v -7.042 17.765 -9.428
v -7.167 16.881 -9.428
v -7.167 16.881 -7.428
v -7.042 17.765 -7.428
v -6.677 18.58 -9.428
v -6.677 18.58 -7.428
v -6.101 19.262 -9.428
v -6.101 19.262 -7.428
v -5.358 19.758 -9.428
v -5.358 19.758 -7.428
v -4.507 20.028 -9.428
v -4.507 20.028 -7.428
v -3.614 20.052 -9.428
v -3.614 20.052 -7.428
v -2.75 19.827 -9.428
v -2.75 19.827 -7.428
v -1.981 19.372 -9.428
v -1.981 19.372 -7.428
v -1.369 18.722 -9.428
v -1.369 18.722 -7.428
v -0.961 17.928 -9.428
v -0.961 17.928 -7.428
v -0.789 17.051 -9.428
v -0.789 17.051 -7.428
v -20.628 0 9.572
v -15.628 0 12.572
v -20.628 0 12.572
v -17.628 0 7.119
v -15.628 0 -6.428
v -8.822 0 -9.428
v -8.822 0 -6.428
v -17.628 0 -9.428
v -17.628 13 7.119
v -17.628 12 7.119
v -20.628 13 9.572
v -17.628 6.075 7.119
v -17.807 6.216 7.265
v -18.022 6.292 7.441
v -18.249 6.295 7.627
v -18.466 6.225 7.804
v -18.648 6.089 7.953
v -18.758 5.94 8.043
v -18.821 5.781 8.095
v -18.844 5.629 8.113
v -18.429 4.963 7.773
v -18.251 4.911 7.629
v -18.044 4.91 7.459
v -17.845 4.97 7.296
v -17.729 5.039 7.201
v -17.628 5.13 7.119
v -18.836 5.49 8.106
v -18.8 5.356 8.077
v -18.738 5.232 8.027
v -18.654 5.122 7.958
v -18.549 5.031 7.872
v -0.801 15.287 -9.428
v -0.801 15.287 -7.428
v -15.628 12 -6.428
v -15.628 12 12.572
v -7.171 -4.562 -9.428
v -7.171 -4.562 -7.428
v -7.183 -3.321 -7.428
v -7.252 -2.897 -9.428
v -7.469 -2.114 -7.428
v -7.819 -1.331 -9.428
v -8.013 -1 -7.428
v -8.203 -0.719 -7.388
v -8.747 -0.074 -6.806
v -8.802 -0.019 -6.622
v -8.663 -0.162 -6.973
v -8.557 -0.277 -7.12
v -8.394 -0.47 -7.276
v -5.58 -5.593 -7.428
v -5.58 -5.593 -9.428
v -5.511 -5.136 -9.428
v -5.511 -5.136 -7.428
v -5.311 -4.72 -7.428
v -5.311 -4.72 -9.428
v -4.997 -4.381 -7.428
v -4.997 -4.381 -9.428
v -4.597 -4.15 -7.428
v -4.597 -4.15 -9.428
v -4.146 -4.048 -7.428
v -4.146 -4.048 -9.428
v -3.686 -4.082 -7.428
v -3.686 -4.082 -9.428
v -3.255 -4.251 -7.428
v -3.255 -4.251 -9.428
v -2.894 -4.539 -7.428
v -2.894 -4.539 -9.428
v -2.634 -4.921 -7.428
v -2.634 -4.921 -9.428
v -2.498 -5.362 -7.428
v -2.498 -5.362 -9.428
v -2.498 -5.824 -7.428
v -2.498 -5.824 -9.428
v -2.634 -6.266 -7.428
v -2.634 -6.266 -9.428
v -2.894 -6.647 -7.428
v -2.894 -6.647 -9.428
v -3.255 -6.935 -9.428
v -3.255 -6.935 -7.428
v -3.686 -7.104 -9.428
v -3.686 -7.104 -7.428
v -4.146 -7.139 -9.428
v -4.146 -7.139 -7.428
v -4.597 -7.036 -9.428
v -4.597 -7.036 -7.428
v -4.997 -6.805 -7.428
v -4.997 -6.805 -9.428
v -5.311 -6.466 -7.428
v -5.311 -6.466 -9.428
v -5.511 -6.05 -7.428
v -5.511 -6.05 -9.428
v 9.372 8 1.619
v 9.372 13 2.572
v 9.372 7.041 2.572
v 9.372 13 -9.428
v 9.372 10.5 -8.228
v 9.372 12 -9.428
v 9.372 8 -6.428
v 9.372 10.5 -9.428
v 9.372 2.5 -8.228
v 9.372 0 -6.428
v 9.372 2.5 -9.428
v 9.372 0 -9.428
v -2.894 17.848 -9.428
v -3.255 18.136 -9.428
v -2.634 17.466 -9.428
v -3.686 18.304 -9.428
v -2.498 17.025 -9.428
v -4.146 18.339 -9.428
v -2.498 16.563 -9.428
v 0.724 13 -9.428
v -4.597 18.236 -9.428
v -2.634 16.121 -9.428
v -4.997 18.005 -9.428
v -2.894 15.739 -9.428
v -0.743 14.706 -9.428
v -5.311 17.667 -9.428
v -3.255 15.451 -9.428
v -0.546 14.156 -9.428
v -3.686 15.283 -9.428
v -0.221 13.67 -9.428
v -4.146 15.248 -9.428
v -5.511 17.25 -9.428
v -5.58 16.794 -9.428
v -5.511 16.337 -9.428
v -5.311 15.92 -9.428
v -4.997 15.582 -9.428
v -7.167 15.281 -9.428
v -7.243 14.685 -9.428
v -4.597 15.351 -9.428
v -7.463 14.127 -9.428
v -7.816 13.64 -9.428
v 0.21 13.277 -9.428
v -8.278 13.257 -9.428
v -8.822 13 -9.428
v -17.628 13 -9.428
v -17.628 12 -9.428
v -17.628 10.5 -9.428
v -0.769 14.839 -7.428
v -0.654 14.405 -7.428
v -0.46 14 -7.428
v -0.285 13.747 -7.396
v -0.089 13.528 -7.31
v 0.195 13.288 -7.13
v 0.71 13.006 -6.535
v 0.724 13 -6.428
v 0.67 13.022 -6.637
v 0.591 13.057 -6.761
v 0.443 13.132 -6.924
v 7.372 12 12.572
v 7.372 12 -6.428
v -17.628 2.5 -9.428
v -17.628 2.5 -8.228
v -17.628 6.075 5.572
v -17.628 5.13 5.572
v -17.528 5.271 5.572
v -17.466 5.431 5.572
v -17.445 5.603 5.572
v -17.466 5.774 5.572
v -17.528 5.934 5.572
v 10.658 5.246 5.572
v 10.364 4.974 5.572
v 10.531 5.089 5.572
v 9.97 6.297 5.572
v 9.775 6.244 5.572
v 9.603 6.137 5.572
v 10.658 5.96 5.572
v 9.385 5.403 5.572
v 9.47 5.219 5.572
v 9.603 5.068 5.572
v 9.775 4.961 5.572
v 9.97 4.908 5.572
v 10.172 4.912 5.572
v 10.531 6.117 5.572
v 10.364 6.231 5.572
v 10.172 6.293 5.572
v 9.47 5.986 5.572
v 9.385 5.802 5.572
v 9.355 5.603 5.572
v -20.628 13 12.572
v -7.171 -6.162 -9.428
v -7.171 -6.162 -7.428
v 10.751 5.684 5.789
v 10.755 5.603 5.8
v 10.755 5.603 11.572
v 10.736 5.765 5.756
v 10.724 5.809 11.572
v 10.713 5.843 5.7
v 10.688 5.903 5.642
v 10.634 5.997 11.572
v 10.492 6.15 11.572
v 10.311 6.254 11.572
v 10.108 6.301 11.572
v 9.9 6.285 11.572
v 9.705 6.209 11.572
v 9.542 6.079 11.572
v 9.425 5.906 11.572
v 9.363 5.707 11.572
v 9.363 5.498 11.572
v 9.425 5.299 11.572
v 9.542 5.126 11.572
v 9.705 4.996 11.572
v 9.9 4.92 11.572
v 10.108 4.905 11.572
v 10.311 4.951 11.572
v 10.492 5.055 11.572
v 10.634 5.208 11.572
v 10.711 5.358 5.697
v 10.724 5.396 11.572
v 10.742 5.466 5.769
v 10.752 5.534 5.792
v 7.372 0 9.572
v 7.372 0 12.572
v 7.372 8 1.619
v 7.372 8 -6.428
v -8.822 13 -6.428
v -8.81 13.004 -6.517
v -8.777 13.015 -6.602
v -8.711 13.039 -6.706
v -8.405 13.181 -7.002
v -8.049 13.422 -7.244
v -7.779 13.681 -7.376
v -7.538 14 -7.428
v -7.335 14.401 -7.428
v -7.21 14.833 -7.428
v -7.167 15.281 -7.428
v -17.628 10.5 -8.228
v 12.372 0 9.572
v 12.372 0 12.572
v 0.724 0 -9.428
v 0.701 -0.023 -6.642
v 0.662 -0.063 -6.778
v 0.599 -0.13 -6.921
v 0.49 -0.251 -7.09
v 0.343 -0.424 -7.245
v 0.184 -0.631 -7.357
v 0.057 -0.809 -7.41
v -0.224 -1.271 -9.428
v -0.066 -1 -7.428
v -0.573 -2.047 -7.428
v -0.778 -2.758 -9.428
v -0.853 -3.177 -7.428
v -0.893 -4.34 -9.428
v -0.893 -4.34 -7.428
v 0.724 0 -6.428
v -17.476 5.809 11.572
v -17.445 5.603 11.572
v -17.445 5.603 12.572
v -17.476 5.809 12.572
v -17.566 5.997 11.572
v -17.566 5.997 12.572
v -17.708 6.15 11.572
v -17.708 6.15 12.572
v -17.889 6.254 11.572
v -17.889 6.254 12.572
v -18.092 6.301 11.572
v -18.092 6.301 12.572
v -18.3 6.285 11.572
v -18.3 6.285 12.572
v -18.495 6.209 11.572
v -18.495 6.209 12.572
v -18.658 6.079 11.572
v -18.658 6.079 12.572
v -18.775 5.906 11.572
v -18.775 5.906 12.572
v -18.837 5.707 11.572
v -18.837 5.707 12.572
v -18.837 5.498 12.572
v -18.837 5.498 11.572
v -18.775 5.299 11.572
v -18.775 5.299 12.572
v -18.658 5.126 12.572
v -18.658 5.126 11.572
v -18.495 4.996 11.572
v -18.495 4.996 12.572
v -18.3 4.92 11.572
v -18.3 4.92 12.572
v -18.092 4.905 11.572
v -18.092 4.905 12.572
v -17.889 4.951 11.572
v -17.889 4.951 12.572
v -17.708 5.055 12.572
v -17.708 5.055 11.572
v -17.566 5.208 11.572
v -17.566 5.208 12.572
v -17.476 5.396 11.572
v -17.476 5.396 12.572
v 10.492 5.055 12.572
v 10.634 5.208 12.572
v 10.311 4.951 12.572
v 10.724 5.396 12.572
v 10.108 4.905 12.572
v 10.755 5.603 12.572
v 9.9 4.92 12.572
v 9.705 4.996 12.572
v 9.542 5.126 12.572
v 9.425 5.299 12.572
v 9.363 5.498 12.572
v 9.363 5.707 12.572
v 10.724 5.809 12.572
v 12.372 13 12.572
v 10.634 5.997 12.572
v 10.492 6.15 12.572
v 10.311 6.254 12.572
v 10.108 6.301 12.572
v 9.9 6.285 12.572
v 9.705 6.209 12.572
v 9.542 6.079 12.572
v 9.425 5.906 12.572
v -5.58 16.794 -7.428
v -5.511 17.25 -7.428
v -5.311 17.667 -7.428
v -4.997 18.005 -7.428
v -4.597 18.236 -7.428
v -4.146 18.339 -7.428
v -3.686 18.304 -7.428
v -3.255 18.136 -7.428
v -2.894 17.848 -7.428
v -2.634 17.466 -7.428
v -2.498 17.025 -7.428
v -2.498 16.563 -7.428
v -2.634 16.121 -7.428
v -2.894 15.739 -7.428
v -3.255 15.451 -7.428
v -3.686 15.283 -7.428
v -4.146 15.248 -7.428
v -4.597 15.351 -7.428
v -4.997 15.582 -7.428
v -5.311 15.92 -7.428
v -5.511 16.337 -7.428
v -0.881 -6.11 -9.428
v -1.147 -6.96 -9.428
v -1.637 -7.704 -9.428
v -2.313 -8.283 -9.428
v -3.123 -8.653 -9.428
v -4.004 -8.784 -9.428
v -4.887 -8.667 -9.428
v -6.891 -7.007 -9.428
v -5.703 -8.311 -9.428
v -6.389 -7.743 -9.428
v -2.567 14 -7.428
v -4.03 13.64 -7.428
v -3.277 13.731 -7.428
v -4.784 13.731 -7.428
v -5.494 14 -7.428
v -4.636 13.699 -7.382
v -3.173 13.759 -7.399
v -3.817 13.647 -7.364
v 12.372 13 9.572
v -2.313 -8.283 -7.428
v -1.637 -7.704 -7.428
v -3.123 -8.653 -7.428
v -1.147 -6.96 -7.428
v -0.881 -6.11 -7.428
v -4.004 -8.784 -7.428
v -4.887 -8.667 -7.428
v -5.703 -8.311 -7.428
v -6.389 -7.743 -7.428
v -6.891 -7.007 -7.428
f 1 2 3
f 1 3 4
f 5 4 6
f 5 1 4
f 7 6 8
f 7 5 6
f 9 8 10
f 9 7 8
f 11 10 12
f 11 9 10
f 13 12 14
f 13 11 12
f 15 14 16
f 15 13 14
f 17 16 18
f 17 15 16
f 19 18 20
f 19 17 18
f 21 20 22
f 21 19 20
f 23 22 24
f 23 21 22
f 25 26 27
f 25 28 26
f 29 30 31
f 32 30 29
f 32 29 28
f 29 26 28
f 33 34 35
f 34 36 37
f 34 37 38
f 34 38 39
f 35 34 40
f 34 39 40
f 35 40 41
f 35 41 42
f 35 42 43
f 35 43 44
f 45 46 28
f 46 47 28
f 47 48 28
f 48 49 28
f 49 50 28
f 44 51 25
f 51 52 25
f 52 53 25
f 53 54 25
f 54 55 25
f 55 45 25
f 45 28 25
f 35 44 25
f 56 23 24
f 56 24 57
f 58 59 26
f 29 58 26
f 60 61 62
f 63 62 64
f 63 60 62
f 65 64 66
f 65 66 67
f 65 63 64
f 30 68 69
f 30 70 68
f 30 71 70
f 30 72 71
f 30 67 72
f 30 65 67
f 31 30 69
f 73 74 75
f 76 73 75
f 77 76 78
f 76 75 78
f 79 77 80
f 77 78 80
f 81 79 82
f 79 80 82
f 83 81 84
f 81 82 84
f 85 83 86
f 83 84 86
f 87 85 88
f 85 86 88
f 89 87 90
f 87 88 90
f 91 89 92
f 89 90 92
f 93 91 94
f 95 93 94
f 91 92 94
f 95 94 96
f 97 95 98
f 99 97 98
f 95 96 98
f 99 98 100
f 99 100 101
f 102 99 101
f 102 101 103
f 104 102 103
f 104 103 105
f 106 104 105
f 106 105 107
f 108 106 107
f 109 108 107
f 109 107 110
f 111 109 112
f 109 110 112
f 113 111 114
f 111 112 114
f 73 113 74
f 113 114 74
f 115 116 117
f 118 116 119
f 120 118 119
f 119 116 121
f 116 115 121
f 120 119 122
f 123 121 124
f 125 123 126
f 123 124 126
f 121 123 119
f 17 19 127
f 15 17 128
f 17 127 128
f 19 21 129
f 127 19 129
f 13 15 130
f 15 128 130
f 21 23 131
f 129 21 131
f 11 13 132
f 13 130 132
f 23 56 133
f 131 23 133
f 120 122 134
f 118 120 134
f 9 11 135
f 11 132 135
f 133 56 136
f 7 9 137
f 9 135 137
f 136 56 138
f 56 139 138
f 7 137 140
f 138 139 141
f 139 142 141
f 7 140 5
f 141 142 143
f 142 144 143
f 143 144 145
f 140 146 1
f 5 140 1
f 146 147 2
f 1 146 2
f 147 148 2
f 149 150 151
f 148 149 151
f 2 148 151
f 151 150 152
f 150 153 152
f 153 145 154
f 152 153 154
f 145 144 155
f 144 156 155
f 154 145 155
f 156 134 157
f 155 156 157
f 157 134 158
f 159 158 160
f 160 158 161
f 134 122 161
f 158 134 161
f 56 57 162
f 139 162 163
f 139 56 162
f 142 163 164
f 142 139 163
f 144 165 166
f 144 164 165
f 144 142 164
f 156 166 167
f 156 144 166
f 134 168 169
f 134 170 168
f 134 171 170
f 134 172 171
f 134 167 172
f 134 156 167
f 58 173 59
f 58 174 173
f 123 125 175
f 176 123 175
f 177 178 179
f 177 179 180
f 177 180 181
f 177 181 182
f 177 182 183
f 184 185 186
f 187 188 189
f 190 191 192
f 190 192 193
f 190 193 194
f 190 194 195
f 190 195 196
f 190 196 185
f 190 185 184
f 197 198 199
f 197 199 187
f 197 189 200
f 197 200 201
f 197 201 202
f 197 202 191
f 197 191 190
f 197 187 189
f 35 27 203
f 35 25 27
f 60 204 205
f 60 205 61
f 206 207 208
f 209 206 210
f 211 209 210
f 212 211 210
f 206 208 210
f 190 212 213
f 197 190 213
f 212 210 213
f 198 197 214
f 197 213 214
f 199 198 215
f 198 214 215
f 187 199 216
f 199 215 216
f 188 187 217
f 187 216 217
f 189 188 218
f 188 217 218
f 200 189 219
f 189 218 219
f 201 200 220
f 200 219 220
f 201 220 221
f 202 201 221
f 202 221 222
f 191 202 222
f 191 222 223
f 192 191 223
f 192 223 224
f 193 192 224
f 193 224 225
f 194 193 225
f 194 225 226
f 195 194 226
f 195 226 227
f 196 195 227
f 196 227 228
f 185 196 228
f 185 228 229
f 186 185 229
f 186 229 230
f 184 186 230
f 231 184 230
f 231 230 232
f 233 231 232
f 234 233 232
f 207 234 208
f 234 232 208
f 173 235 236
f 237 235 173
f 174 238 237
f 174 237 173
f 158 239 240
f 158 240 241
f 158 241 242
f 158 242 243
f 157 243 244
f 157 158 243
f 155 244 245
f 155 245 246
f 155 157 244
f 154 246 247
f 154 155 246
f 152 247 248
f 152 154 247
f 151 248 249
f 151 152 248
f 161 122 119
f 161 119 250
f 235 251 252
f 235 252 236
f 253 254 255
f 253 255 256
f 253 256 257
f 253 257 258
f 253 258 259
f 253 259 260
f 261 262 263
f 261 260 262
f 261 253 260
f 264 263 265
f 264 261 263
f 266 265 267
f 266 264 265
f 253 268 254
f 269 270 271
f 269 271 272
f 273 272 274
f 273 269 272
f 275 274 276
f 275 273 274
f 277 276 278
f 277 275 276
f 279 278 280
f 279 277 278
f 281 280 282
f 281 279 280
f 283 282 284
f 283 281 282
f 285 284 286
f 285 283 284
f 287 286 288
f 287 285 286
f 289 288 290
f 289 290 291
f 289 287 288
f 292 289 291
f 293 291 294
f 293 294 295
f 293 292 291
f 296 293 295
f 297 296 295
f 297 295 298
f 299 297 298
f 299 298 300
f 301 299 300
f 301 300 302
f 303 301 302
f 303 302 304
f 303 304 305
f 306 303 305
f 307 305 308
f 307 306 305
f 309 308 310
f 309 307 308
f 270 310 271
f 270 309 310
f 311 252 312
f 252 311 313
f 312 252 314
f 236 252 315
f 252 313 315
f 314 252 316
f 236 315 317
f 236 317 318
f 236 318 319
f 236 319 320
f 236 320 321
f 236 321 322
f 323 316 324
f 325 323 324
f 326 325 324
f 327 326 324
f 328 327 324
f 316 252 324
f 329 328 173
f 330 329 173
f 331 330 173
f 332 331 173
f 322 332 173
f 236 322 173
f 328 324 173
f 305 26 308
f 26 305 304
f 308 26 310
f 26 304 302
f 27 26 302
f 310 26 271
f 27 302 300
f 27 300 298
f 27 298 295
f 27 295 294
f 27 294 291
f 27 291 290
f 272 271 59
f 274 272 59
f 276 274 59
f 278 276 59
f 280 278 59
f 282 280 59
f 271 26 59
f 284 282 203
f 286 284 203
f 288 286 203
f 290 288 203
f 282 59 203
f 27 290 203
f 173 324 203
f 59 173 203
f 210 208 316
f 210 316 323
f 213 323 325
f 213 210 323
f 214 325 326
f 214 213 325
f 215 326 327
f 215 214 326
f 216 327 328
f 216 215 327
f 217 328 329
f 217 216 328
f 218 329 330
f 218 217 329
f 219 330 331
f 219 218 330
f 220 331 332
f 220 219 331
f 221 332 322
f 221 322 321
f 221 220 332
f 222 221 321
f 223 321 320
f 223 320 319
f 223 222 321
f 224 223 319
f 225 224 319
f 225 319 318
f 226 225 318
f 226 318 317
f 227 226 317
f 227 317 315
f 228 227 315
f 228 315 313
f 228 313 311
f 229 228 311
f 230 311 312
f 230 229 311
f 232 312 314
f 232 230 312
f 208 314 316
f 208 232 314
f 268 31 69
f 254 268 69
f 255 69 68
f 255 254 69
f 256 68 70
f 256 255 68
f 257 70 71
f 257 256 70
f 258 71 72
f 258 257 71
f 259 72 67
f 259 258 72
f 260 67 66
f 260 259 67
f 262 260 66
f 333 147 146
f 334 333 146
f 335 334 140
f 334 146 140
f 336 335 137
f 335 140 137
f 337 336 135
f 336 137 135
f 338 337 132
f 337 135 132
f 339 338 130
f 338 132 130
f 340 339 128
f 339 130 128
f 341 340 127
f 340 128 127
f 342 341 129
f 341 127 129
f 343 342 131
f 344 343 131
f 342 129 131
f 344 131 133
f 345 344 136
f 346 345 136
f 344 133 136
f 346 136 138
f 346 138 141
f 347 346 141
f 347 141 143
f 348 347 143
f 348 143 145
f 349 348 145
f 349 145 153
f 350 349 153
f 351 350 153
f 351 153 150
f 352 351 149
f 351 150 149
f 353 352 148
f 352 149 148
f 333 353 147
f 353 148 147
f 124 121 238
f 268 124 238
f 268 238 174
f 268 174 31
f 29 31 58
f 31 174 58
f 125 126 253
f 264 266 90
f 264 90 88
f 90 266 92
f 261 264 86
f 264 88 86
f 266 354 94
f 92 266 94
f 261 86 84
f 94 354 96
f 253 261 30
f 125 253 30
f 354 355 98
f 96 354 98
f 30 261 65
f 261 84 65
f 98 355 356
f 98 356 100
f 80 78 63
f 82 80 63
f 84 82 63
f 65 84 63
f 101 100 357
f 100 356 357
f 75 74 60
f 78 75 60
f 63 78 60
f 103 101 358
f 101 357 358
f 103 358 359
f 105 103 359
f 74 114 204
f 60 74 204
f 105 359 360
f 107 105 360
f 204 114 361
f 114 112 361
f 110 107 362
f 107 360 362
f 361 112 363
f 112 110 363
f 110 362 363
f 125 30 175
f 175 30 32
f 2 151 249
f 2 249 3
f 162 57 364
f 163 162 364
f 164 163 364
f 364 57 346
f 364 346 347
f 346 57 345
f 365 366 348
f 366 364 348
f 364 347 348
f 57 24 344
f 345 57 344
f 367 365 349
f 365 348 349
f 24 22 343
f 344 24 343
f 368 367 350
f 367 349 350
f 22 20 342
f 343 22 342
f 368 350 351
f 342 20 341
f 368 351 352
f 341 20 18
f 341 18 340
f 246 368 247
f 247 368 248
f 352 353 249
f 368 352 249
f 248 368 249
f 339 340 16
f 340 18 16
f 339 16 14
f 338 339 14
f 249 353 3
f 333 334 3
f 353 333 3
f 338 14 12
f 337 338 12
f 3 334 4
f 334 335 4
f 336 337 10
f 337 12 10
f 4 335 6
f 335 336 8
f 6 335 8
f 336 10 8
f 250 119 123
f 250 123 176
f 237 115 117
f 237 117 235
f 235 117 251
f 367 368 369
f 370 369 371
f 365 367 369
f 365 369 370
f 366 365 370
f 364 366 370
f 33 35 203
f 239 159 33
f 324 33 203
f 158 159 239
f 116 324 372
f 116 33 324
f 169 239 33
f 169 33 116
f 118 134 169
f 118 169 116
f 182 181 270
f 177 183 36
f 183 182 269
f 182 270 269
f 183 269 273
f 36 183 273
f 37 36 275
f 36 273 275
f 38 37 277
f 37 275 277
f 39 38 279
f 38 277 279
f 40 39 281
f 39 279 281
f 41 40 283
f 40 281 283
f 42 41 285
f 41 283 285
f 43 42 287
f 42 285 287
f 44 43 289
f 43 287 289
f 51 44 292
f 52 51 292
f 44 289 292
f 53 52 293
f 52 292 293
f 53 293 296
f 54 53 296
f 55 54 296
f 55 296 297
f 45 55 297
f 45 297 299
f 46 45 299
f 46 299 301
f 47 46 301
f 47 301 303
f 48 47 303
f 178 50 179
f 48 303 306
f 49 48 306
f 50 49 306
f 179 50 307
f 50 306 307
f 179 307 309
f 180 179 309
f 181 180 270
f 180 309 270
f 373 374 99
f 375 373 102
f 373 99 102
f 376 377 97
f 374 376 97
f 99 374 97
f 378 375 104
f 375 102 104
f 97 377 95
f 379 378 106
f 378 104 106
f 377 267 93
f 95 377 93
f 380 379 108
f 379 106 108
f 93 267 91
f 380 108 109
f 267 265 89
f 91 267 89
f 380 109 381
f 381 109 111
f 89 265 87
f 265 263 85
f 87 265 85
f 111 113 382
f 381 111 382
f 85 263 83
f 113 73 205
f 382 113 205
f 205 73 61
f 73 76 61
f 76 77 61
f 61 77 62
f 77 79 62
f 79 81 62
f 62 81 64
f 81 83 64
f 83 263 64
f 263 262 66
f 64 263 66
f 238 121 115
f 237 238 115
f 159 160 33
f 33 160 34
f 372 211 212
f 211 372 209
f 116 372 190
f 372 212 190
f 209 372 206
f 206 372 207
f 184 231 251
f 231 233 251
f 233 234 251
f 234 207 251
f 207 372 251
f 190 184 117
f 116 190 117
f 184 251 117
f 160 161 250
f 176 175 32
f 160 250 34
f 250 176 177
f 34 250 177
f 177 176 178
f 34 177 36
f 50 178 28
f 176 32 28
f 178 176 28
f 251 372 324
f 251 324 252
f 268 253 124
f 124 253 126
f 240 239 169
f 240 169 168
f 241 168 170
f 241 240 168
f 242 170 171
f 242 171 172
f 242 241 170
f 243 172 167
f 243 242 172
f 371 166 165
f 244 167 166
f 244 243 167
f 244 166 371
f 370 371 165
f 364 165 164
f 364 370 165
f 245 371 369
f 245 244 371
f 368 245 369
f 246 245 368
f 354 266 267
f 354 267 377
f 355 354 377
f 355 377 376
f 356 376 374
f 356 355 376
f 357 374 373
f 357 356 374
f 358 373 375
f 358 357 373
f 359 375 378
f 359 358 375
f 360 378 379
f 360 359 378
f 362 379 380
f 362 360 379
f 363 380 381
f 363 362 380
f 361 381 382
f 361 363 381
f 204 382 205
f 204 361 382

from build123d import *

# Parameters (mm, degrees)
SKETCH1_W           = 26.999950409
SKETCH1_H           = 3
BOSS_EXTRUDE1_DEPTH = 12
CUT_EXTRUDE1_DEPTH  = 11.5
BOSS_EXTRUDE2_DEPTH = 1
SKETCH7_R           = 0.7
CUT_EXTRUDE2_DEPTH  = 6
SKETCH8_R           = 1.549809906
BOSS_EXTRUDE3_DEPTH = 2
SKETCH11_W          = 30.763753833
SKETCH11_H          = 8
CUT_EXTRUDE3_DEPTH  = 1.2
FILLET1_R           = 1
SKETCH12_R          = 3.153602023
CUT_EXTRUDE4_DEPTH  = 10
CUT_EXTRUDE5_DEPTH  = 2
SKETCH14_R          = 0.7
BOSS_EXTRUDE4_DEPTH = 1


with BuildPart() as part:
    # Sketch1 → Boss-Extrude1 (new body)
    with BuildSketch(Plane(origin=(0, 0, 0), x_dir=(1, 0, 0), z_dir=(0, 1, 0))):
        with Locations((-4.128207024, 7.928244269)):
            Rectangle(SKETCH1_W, SKETCH1_H)
        Polygon((7.371810524, -11.571754957), (7.371810524, 4.428244174), (-15.628224572, 4.428244174), (-15.628224572, -11.571754957), (-15.728224572, -11.571754957), (-20.628203209, -11.571754957), (-20.628203209, -9.571756491), (-17.628182229, -7.119161332), (-17.628182229, 6.428244269), (9.37176818, 6.428244269), (9.37176818, -2.571755344), (12.371848766, -9.571756491), (12.371848766, -11.571754957), (7.471810524, -11.571754957), align=None)
    extrude(amount=BOSS_EXTRUDE1_DEPTH)

    # Sketch4 → Cut-Extrude1 (cut)
    with BuildSketch(Plane(origin=(12.371848766, 0, 0), x_dir=(0, 0, -1), z_dir=(1, 0, 0))):
        Polygon((4.428244174, 0), (4.428244174, 8.000016212), (-1.618738598, 8.000016212), (-9.571756491, 0), (-11.571754957, 0), align=None)
    extrude(amount=-CUT_EXTRUDE1_DEPTH, mode=Mode.SUBTRACT)

    # Sketch5 → Boss-Extrude2 (add)
    with BuildSketch(Plane(origin=(0, 12, 0), x_dir=(1, 0, 0), z_dir=(0, 1, 0))):
        Polygon((-20.628203209, -9.571756491), (-20.628203209, -11.571754957), (12.371848766, -11.571754957), (12.371848766, -9.571756491), (9.37176818, -2.571755344), (9.37176818, 9.428244269), (-17.628182229, 9.428244269), (-17.628182229, -7.119161332), align=None)
    extrude(amount=BOSS_EXTRUDE2_DEPTH)

    # Sketch7 → Cut-Extrude2 (cut)
    with BuildSketch(Plane.XY.offset(11.571754957)):
        with Locations((-18.144630941, 5.602586011)):
            Circle(SKETCH7_R)
        with Locations((10.055363141, 5.602566371)):
            Circle(SKETCH7_R)
    extrude(amount=-CUT_EXTRUDE2_DEPTH, mode=Mode.SUBTRACT)

    # Sketch8 → Boss-Extrude3 (add)
    with BuildSketch(Plane(origin=(0, 0, -9.428244269), x_dir=(-1, 0, 0), z_dir=(0, 0, -1))):
        with BuildLine():
            ThreePointArc((7.167350646, 16.881210895), (4.06111535, 20.071343328), (0.789350976, 17.051210792))
            Line((0.789350976, 17.051210792), (0.801312783, 15.286719843))
            ThreePointArc((0.801312783, 15.286719843), (0.398304036, 13.90328737), (-0.724359486, 13))
            Line((-0.724359486, 13), (8.821641956, 13))
            ThreePointArc((8.821641956, 13), (7.624453215, 13.872256527), (7.167350646, 15.281209887))
            Line((7.167350646, 15.281209887), (7.167350646, 16.881210895))
        make_face()
        with Locations((4.030375515, 16.793532247)):
            Circle(SKETCH8_R, mode=Mode.SUBTRACT)
        with BuildLine():
            Line((8.821641956, 0), (-0.724359486, 0))
            ThreePointArc((-0.724359486, 0), (0.554106373, -1.994843204), (0.893224509, -4.339810848))
            Line((0.893224509, -4.339810848), (0.881225349, -6.109811753))
            ThreePointArc((0.881225349, -6.109811753), (4.004145214, -8.784221579), (7.170605746, -6.16150846))
            Line((7.170605746, -6.16150846), (7.170605746, -4.561507453))
            ThreePointArc((7.170605746, -4.561507453), (7.476553675, -2.092695462), (8.821641956, 0))
        make_face()
        with Locations((4.030375515, -5.593063946)):
            Circle(SKETCH8_R, mode=Mode.SUBTRACT)
    extrude(amount=-BOSS_EXTRUDE3_DEPTH)

    # Sketch11 → Cut-Extrude3 (cut)
    with BuildSketch(Plane(origin=(0, 0, -9.428244269), x_dir=(-1, 0, 0), z_dir=(0, 0, -1))):
        with Locations((4.128177222, 6.5)):
            Rectangle(SKETCH11_W, SKETCH11_H)
    extrude(amount=-CUT_EXTRUDE3_DEPTH, mode=Mode.SUBTRACT)

    # Fillet1
    fillet1_edges = [part.edges().sort_by_distance(p)[0] for p in [
        (-4.048641235, 13, -7.428244269),
        (-4.048641235, 0, -7.428244269),
    ]]
    fillet(fillet1_edges, radius=FILLET1_R)

    # Sketch12 → Cut-Extrude4 (cut)
    with BuildSketch(Plane.XY.offset(-7.428244269)):
        with Locations((-4.030375515, 16.793532247)):
            Circle(SKETCH12_R)
    extrude(amount=CUT_EXTRUDE4_DEPTH, mode=Mode.SUBTRACT)

    # Sketch13 → Cut-Extrude5 (cut)
    with BuildSketch(Plane.XY.offset(-4.428244174)):
        Polygon((-15.628224572, 0), (-15.628224572, 12), (7.371810524, 12), (7.371810524, 8.000016212), (9.37176818, 8.000016212), (9.37176818, 0), (7.371810524, 0), align=None)
    extrude(amount=-CUT_EXTRUDE5_DEPTH, mode=Mode.SUBTRACT)

    # Sketch14 → Boss-Extrude4 (add)
    with BuildSketch(Plane.XY.offset(11.571754957)):
        Polygon((-20.628203209, 0), (-20.628203209, 13), (12.371848766, 13), (12.371848766, 0), (7.371810524, 0), (7.371810524, 12), (-15.628224572, 12), (-15.628224572, 0), align=None)
        with Locations((-18.144630941, 5.602586011)):
            Circle(SKETCH14_R, mode=Mode.SUBTRACT)
        with Locations((10.055363141, 5.602566371)):
            Circle(SKETCH14_R, mode=Mode.SUBTRACT)
    extrude(amount=BOSS_EXTRUDE4_DEPTH)


solid = part.part
